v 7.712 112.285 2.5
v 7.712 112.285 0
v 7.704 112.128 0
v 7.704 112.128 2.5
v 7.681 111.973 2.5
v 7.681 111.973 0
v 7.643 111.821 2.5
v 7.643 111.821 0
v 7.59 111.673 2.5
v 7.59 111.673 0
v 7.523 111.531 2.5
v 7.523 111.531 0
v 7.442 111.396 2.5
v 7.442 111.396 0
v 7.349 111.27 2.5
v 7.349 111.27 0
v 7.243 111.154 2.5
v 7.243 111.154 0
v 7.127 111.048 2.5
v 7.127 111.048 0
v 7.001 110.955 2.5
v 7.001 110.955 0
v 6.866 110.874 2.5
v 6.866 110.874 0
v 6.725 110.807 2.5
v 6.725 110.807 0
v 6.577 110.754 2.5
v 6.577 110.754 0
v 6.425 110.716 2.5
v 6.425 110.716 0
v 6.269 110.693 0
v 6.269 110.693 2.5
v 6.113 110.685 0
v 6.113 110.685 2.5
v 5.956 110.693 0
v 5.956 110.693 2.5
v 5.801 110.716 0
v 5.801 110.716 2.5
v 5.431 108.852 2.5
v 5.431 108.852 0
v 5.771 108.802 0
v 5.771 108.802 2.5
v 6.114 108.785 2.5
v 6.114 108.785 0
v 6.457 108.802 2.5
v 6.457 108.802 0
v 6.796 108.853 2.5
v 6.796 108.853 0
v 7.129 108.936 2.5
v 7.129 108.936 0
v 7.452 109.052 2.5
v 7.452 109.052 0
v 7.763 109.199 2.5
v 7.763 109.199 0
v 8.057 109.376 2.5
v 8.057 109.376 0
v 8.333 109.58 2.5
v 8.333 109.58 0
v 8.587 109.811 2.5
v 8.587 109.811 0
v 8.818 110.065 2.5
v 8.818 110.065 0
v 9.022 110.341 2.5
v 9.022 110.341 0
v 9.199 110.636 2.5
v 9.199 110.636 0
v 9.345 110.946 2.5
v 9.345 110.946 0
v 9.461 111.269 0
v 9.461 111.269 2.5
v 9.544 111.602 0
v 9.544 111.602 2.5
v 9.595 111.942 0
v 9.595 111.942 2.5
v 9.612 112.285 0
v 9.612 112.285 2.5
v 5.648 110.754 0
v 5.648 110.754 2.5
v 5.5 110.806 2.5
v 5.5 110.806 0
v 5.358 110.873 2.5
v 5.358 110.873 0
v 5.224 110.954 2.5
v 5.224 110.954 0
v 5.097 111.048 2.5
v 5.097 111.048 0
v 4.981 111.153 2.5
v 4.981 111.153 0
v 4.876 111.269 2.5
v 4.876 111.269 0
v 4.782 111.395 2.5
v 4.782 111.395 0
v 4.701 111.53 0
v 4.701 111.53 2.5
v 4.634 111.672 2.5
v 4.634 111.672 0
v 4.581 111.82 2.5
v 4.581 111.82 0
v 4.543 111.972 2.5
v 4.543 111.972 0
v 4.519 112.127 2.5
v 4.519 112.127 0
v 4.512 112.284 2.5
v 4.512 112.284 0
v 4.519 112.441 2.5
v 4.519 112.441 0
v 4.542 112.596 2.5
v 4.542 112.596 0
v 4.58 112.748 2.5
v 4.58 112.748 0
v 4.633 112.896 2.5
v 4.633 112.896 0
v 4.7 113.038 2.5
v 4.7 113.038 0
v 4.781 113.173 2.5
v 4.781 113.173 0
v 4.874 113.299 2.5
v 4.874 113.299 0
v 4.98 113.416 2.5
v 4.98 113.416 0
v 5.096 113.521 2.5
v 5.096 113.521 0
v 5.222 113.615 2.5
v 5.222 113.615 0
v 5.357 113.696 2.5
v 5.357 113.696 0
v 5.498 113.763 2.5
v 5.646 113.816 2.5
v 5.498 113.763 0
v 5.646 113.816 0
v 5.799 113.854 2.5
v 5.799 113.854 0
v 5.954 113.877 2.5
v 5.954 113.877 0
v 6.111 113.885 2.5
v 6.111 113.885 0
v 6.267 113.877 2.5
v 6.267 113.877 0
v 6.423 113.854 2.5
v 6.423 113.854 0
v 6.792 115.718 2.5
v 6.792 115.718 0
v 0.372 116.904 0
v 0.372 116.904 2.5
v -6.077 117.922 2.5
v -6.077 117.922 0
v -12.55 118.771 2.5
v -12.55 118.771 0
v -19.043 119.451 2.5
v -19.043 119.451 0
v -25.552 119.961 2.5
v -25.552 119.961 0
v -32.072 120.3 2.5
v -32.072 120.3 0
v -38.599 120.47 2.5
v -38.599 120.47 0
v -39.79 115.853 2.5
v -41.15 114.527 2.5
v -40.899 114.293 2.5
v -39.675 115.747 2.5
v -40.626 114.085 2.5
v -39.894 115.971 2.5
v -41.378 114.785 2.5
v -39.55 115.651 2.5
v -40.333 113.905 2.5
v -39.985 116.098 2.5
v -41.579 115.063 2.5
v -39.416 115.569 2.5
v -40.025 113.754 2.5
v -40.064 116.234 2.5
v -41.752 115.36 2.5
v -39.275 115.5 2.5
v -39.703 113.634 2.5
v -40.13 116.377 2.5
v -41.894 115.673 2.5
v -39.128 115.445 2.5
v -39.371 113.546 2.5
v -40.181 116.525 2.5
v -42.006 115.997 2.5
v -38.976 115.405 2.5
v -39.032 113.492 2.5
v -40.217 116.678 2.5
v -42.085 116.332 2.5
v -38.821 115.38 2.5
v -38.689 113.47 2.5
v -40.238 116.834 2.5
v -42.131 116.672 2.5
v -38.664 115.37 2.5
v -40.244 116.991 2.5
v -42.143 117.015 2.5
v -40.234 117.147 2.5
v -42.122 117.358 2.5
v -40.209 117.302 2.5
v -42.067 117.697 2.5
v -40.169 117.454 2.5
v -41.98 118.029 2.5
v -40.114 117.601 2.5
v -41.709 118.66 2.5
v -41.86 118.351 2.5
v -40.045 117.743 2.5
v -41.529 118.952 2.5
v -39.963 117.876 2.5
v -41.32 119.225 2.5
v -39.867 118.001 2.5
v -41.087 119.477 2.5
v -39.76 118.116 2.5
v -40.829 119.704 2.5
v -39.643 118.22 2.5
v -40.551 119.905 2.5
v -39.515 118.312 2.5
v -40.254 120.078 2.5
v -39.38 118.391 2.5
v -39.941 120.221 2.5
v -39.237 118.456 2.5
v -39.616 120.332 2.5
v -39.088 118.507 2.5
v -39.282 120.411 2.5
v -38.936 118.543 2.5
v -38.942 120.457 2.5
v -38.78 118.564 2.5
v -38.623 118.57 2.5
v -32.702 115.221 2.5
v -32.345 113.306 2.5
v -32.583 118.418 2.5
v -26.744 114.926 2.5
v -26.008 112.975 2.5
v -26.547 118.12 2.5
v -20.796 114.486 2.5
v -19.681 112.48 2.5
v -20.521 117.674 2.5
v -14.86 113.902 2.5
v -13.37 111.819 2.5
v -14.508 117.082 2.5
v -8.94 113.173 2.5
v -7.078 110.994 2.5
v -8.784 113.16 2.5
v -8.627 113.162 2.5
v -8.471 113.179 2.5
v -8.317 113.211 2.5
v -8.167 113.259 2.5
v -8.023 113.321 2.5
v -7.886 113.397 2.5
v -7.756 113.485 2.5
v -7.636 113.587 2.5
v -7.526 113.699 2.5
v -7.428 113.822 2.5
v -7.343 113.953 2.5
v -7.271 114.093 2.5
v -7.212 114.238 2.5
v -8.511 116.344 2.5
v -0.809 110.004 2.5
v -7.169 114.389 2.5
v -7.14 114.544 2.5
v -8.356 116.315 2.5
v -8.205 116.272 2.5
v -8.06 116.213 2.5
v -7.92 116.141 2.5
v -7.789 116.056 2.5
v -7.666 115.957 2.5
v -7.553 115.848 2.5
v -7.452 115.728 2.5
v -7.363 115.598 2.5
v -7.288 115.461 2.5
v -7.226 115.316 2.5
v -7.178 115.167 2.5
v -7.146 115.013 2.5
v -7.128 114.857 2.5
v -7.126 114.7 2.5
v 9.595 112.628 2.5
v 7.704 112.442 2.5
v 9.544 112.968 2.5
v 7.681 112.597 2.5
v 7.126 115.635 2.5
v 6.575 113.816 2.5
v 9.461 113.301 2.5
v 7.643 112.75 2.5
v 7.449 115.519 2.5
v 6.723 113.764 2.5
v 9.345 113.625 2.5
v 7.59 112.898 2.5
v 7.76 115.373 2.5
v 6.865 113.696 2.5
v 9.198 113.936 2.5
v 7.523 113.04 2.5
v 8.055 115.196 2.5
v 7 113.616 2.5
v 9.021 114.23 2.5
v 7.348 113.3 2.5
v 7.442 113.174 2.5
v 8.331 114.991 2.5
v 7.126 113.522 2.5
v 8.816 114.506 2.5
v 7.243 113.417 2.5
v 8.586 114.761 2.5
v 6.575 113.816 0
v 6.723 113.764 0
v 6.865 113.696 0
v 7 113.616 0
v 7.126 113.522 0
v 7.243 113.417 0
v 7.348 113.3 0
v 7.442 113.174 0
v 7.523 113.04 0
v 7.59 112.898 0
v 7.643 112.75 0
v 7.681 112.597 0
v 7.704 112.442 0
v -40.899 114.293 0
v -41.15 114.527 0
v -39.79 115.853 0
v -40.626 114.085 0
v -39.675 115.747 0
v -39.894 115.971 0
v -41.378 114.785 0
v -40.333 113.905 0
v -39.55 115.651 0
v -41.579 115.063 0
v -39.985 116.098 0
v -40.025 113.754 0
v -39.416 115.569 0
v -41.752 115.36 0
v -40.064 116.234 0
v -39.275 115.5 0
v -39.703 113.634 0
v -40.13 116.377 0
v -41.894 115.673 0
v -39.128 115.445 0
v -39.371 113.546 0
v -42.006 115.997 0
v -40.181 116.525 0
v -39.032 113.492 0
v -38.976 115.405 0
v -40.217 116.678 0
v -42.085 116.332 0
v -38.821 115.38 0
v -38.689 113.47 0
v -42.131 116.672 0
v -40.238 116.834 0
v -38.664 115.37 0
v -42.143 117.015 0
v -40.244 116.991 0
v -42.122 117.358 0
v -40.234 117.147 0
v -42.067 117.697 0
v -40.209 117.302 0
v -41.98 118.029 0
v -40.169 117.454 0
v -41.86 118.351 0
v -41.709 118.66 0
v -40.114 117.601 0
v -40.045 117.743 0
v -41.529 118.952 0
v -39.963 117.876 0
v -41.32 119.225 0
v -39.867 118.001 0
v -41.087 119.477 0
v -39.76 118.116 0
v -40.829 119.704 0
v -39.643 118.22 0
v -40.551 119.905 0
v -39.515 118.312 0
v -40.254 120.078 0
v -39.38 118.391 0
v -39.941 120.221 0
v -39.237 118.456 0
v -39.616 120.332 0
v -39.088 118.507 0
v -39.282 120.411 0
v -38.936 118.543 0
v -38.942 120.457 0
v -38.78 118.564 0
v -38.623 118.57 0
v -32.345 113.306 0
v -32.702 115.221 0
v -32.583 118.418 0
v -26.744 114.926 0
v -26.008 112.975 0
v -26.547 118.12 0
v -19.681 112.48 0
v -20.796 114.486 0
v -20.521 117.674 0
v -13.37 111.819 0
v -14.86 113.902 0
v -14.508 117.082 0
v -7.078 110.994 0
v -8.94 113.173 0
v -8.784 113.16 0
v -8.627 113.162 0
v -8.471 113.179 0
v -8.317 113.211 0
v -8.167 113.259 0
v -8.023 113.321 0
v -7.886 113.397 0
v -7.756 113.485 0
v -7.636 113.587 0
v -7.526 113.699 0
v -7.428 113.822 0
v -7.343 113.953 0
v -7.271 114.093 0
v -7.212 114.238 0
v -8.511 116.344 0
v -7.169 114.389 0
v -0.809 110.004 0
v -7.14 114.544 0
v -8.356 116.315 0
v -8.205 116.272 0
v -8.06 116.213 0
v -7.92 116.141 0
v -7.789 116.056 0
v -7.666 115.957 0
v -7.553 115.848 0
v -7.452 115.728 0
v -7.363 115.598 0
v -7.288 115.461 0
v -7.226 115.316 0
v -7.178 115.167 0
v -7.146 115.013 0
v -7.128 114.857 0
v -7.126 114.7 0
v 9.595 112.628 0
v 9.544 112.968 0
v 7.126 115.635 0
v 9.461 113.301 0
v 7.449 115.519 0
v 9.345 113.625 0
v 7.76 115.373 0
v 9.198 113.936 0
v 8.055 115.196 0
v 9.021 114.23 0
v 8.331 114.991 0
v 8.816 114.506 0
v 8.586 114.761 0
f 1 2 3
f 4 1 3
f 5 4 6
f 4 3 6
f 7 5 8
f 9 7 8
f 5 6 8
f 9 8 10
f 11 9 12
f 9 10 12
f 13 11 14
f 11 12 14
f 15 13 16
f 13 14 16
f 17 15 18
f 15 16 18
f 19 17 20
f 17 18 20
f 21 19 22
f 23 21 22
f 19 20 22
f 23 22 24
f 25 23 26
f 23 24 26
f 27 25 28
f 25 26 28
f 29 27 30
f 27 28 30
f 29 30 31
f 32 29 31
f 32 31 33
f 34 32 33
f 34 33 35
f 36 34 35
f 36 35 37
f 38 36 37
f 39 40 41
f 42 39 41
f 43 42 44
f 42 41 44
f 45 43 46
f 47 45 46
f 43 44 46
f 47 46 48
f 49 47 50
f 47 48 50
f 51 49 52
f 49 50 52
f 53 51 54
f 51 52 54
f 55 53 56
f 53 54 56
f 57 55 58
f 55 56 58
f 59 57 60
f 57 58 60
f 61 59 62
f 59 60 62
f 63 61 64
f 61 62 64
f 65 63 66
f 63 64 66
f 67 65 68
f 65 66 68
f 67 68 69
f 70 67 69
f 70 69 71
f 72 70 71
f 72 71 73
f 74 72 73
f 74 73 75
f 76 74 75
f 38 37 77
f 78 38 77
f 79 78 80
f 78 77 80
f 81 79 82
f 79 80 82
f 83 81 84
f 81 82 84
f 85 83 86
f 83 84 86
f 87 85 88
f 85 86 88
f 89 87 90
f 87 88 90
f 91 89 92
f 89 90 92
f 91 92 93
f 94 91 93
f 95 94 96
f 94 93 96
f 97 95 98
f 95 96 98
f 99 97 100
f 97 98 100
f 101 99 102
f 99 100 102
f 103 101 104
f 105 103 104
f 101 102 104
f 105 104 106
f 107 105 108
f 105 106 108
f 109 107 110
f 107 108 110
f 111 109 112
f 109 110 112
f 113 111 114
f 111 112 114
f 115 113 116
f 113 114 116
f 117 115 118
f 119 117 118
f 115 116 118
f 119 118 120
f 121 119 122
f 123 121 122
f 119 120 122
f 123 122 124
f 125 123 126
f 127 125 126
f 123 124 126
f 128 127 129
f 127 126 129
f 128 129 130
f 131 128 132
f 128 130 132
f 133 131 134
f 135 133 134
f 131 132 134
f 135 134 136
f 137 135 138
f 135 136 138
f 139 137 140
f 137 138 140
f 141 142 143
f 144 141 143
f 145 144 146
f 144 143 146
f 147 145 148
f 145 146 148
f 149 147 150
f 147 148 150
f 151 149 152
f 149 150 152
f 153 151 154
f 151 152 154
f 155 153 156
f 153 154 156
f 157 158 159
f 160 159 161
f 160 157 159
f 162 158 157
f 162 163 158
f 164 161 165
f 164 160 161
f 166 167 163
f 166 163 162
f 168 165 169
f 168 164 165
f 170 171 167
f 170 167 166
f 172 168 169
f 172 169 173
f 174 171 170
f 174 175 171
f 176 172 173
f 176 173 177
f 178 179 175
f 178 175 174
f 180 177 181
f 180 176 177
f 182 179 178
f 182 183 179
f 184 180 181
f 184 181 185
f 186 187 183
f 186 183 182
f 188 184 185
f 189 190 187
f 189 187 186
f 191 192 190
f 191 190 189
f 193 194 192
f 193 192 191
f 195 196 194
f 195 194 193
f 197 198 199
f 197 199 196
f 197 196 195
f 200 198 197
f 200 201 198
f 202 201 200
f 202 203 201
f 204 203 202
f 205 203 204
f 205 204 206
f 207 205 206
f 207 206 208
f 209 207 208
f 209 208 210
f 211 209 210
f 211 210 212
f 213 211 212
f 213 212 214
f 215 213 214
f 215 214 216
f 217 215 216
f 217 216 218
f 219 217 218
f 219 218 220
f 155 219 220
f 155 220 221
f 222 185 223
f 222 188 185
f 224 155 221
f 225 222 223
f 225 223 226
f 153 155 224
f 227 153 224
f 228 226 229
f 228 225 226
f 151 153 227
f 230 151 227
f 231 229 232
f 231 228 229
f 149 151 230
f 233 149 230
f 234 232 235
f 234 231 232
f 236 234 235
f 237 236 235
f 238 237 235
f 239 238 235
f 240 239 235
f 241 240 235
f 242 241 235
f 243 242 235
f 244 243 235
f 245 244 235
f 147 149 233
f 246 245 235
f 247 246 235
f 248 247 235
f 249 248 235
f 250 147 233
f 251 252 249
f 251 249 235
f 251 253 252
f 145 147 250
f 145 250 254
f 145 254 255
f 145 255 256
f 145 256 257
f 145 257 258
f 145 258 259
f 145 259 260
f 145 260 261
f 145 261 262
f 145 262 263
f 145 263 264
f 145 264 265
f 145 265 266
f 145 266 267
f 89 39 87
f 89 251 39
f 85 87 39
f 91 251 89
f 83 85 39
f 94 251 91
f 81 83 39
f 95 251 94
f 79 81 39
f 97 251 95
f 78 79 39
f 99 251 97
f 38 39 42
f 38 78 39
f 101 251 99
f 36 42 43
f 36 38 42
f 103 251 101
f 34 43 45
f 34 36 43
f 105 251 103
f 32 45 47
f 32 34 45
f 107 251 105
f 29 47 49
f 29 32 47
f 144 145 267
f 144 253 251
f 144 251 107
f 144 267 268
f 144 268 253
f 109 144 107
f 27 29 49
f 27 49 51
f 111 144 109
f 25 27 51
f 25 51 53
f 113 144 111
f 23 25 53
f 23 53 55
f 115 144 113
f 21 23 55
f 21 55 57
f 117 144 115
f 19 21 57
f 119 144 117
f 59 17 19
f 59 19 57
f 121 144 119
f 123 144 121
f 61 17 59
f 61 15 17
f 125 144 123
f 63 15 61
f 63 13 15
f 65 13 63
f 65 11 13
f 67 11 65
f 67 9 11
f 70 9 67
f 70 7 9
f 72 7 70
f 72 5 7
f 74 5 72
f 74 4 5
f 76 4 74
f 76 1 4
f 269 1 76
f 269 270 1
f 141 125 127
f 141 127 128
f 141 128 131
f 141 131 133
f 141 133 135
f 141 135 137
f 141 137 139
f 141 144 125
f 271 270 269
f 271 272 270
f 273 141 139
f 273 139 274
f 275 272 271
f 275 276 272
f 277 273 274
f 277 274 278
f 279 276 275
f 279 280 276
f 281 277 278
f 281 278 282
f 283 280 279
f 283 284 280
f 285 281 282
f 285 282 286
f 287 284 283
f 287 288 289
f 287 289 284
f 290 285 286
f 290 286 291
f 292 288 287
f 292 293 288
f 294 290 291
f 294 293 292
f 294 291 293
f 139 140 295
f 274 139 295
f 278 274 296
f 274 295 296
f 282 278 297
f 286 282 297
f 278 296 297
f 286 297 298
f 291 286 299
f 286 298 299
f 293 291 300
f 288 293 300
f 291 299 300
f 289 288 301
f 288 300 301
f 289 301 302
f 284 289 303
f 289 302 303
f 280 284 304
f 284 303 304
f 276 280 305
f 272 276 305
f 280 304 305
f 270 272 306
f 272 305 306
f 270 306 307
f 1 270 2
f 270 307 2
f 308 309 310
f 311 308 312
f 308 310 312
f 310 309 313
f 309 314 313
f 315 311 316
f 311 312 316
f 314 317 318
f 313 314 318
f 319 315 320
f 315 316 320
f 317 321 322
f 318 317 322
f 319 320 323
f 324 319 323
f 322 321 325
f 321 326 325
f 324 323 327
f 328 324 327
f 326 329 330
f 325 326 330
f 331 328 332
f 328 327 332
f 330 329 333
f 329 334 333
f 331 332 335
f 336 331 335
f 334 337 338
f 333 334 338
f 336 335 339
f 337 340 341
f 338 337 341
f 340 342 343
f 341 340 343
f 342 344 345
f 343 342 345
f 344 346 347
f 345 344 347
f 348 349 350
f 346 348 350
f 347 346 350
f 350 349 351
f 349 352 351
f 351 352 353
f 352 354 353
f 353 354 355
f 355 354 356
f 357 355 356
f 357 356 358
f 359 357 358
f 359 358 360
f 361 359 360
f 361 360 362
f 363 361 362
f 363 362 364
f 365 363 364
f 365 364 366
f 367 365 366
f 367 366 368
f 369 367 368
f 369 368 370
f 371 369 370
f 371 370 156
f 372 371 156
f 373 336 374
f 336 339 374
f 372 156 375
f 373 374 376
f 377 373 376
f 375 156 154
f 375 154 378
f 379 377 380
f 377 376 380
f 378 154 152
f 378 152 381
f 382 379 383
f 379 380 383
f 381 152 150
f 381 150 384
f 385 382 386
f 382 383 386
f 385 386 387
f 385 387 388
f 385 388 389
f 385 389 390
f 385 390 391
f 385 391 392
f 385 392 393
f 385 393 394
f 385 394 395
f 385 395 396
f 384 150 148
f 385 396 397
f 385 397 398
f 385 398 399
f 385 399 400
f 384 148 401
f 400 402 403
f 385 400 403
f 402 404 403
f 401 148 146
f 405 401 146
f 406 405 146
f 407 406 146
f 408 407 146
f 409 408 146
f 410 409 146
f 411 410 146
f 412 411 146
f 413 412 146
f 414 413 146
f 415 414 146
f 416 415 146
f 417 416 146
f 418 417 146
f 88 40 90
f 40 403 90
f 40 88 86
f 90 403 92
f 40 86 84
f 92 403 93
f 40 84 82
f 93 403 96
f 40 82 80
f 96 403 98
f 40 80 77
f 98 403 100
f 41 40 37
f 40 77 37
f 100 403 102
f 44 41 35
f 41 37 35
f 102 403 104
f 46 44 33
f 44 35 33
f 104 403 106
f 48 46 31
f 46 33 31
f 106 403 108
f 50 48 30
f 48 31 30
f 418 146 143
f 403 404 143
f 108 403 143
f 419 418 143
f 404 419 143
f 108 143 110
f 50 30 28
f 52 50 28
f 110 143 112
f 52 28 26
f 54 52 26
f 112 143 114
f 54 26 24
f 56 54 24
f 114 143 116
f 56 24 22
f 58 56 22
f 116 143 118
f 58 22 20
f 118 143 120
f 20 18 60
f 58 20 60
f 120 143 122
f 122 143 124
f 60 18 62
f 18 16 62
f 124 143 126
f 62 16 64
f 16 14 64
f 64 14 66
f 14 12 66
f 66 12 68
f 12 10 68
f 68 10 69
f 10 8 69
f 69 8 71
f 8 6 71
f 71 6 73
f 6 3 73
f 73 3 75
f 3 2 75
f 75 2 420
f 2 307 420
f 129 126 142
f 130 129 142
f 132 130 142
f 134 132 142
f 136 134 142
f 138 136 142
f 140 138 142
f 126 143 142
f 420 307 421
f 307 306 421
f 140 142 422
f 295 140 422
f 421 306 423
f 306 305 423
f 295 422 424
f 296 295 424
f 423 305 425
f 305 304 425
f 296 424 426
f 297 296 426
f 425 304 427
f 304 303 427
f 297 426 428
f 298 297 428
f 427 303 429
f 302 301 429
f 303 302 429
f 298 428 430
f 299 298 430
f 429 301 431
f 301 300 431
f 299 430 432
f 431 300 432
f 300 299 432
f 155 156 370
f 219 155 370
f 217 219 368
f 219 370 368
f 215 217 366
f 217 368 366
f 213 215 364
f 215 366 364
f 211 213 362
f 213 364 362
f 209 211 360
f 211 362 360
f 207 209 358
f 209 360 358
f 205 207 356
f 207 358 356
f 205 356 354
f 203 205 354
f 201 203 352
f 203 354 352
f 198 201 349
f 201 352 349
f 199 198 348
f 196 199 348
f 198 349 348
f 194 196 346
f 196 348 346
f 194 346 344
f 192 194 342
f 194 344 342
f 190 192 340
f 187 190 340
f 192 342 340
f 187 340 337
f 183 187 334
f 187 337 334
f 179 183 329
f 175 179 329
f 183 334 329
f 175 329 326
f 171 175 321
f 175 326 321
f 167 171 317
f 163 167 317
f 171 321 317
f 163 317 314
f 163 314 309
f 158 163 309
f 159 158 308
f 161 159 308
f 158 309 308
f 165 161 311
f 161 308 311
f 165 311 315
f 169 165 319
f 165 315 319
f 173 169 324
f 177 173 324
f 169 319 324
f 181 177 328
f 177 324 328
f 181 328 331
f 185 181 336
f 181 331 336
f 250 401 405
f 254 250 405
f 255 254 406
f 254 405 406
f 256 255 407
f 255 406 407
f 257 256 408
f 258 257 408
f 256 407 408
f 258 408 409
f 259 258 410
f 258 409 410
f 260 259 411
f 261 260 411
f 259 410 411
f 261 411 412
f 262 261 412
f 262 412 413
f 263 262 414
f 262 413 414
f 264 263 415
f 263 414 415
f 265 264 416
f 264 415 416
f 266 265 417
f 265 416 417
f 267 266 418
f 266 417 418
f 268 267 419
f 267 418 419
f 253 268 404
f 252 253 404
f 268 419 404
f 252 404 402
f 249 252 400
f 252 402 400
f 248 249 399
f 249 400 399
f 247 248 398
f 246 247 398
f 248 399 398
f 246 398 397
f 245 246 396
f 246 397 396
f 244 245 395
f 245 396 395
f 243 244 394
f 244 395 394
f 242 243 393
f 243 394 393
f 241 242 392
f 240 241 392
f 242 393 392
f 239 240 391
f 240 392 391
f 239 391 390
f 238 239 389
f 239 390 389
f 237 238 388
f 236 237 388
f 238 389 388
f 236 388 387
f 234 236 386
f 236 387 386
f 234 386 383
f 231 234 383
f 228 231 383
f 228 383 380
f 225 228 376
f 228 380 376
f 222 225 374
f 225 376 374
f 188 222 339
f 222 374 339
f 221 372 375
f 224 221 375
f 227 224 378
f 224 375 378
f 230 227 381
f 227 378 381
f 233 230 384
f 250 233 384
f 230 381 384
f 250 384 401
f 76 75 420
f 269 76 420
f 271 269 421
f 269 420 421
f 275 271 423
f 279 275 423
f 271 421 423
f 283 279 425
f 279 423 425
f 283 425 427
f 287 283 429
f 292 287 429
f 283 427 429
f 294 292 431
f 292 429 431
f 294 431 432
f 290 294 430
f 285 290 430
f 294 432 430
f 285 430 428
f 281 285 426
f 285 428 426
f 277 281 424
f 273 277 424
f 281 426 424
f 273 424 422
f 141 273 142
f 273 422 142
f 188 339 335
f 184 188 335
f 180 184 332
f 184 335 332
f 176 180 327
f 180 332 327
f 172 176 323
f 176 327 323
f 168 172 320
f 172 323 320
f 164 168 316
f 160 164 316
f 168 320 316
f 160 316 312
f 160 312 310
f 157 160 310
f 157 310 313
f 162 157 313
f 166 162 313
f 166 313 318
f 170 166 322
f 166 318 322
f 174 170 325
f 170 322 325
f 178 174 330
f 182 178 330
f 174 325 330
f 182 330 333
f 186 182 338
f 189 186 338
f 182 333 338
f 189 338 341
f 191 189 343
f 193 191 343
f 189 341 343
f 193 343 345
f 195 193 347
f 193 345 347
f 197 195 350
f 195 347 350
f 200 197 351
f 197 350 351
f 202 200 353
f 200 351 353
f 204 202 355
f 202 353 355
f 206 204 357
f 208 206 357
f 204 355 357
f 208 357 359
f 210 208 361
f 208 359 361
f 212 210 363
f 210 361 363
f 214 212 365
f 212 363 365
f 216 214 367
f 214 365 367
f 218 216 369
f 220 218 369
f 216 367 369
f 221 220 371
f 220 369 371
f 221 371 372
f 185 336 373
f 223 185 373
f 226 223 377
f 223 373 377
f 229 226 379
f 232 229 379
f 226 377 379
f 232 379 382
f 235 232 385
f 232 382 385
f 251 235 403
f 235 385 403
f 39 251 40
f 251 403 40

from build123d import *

# Parameters (mm, degrees)
BOSS_EXTRUDE1_DEPTH = 2.5


with BuildPart() as part:
    # Sketch1 → Boss-Extrude1 (new body)
    with BuildSketch(Plane.XY):
        with BuildLine():
            ThreePointArc((-8.510567712, 116.344003682), (-2.565917232, 115.465075188), (3.355702363, 114.442428619))
            ThreePointArc((3.355702363, 114.442428619), (4.893623339, 115.566180636), (6.792287095, 115.718152566))
            ThreePointArc((6.792287095, 115.718152566), (-15.794510782, 119.131957807), (-38.598624107, 120.46983672))
            ThreePointArc((-38.598624107, 120.46983672), (-42.143476749, 117.015271661), (-38.68891169, 113.470419019))
            ThreePointArc((-38.68891169, 113.470419019), (-16.523313538, 112.170000716), (5.431053998, 108.851782021))
            ThreePointArc((5.431053998, 108.851782021), (3.750229497, 109.701636852), (2.753244442, 111.299587114))
            ThreePointArc((2.753244442, 111.299587114), (-3.082169507, 112.306976764), (-8.940234626, 113.172980765))
            ThreePointArc((-8.940234626, 113.172980765), (-23.768861657, 114.724233518), (-38.66440506, 115.370260966))
            ThreePointArc((-38.66440506, 115.370260966), (-40.243634801, 116.990765031), (-38.623130736, 118.569994772))
            ThreePointArc((-38.623130736, 118.569994772), (-23.532953855, 117.915525969), (-8.510567712, 116.344003682))
        make_face()
        with BuildLine():
            ThreePointArc((6.42280954, 113.854423418), (7.348162032, 113.300392724), (7.711670546, 112.284967294))
            ThreePointArc((7.711670546, 112.284967294), (7.127095977, 111.048475808), (5.800531553, 110.715511169))
            ThreePointArc((5.800531553, 110.715511169), (4.277812999, 111.012375136), (2.753244442, 111.299587114))
            ThreePointArc((2.753244442, 111.299587114), (3.750229497, 109.701636852), (5.431053998, 108.851782021))
            ThreePointArc((5.431053998, 108.851782021), (8.332913676, 109.580142168), (9.611670546, 112.284967294))
            ThreePointArc((9.611670546, 112.284967294), (8.816495672, 114.506210423), (6.792287095, 115.718152566))
            ThreePointArc((6.792287095, 115.718152566), (4.893623339, 115.566180636), (3.355702363, 114.442428619))
            ThreePointArc((3.355702363, 114.442428619), (4.890181151, 114.153251974), (6.42280954, 113.854423418))
        make_face()
        with BuildLine():
            ThreePointArc((5.800531553, 110.715511169), (4.542214422, 112.596106287), (6.42280954, 113.854423418))
            ThreePointArc((6.42280954, 113.854423418), (4.890181151, 114.153251974), (3.355702363, 114.442428619))
            ThreePointArc((3.355702363, 114.442428619), (2.674256175, 112.943892509), (2.753244442, 111.299587114))
            ThreePointArc((2.753244442, 111.299587114), (4.277812999, 111.012375136), (5.800531553, 110.715511169))
        make_face()
        with BuildLine():
            ThreePointArc((2.753244442, 111.299587114), (2.674256175, 112.943892509), (3.355702363, 114.442428619))
            ThreePointArc((3.355702363, 114.442428619), (-2.565917232, 115.465075188), (-8.510567712, 116.344003682))
            ThreePointArc((-8.510567712, 116.344003682), (-7.13988971, 114.543658766), (-8.940234626, 113.172980765))
            ThreePointArc((-8.940234626, 113.172980765), (-3.082169507, 112.306976764), (2.753244442, 111.299587114))
        make_face()
    extrude(amount=BOSS_EXTRUDE1_DEPTH)


solid = part.part
